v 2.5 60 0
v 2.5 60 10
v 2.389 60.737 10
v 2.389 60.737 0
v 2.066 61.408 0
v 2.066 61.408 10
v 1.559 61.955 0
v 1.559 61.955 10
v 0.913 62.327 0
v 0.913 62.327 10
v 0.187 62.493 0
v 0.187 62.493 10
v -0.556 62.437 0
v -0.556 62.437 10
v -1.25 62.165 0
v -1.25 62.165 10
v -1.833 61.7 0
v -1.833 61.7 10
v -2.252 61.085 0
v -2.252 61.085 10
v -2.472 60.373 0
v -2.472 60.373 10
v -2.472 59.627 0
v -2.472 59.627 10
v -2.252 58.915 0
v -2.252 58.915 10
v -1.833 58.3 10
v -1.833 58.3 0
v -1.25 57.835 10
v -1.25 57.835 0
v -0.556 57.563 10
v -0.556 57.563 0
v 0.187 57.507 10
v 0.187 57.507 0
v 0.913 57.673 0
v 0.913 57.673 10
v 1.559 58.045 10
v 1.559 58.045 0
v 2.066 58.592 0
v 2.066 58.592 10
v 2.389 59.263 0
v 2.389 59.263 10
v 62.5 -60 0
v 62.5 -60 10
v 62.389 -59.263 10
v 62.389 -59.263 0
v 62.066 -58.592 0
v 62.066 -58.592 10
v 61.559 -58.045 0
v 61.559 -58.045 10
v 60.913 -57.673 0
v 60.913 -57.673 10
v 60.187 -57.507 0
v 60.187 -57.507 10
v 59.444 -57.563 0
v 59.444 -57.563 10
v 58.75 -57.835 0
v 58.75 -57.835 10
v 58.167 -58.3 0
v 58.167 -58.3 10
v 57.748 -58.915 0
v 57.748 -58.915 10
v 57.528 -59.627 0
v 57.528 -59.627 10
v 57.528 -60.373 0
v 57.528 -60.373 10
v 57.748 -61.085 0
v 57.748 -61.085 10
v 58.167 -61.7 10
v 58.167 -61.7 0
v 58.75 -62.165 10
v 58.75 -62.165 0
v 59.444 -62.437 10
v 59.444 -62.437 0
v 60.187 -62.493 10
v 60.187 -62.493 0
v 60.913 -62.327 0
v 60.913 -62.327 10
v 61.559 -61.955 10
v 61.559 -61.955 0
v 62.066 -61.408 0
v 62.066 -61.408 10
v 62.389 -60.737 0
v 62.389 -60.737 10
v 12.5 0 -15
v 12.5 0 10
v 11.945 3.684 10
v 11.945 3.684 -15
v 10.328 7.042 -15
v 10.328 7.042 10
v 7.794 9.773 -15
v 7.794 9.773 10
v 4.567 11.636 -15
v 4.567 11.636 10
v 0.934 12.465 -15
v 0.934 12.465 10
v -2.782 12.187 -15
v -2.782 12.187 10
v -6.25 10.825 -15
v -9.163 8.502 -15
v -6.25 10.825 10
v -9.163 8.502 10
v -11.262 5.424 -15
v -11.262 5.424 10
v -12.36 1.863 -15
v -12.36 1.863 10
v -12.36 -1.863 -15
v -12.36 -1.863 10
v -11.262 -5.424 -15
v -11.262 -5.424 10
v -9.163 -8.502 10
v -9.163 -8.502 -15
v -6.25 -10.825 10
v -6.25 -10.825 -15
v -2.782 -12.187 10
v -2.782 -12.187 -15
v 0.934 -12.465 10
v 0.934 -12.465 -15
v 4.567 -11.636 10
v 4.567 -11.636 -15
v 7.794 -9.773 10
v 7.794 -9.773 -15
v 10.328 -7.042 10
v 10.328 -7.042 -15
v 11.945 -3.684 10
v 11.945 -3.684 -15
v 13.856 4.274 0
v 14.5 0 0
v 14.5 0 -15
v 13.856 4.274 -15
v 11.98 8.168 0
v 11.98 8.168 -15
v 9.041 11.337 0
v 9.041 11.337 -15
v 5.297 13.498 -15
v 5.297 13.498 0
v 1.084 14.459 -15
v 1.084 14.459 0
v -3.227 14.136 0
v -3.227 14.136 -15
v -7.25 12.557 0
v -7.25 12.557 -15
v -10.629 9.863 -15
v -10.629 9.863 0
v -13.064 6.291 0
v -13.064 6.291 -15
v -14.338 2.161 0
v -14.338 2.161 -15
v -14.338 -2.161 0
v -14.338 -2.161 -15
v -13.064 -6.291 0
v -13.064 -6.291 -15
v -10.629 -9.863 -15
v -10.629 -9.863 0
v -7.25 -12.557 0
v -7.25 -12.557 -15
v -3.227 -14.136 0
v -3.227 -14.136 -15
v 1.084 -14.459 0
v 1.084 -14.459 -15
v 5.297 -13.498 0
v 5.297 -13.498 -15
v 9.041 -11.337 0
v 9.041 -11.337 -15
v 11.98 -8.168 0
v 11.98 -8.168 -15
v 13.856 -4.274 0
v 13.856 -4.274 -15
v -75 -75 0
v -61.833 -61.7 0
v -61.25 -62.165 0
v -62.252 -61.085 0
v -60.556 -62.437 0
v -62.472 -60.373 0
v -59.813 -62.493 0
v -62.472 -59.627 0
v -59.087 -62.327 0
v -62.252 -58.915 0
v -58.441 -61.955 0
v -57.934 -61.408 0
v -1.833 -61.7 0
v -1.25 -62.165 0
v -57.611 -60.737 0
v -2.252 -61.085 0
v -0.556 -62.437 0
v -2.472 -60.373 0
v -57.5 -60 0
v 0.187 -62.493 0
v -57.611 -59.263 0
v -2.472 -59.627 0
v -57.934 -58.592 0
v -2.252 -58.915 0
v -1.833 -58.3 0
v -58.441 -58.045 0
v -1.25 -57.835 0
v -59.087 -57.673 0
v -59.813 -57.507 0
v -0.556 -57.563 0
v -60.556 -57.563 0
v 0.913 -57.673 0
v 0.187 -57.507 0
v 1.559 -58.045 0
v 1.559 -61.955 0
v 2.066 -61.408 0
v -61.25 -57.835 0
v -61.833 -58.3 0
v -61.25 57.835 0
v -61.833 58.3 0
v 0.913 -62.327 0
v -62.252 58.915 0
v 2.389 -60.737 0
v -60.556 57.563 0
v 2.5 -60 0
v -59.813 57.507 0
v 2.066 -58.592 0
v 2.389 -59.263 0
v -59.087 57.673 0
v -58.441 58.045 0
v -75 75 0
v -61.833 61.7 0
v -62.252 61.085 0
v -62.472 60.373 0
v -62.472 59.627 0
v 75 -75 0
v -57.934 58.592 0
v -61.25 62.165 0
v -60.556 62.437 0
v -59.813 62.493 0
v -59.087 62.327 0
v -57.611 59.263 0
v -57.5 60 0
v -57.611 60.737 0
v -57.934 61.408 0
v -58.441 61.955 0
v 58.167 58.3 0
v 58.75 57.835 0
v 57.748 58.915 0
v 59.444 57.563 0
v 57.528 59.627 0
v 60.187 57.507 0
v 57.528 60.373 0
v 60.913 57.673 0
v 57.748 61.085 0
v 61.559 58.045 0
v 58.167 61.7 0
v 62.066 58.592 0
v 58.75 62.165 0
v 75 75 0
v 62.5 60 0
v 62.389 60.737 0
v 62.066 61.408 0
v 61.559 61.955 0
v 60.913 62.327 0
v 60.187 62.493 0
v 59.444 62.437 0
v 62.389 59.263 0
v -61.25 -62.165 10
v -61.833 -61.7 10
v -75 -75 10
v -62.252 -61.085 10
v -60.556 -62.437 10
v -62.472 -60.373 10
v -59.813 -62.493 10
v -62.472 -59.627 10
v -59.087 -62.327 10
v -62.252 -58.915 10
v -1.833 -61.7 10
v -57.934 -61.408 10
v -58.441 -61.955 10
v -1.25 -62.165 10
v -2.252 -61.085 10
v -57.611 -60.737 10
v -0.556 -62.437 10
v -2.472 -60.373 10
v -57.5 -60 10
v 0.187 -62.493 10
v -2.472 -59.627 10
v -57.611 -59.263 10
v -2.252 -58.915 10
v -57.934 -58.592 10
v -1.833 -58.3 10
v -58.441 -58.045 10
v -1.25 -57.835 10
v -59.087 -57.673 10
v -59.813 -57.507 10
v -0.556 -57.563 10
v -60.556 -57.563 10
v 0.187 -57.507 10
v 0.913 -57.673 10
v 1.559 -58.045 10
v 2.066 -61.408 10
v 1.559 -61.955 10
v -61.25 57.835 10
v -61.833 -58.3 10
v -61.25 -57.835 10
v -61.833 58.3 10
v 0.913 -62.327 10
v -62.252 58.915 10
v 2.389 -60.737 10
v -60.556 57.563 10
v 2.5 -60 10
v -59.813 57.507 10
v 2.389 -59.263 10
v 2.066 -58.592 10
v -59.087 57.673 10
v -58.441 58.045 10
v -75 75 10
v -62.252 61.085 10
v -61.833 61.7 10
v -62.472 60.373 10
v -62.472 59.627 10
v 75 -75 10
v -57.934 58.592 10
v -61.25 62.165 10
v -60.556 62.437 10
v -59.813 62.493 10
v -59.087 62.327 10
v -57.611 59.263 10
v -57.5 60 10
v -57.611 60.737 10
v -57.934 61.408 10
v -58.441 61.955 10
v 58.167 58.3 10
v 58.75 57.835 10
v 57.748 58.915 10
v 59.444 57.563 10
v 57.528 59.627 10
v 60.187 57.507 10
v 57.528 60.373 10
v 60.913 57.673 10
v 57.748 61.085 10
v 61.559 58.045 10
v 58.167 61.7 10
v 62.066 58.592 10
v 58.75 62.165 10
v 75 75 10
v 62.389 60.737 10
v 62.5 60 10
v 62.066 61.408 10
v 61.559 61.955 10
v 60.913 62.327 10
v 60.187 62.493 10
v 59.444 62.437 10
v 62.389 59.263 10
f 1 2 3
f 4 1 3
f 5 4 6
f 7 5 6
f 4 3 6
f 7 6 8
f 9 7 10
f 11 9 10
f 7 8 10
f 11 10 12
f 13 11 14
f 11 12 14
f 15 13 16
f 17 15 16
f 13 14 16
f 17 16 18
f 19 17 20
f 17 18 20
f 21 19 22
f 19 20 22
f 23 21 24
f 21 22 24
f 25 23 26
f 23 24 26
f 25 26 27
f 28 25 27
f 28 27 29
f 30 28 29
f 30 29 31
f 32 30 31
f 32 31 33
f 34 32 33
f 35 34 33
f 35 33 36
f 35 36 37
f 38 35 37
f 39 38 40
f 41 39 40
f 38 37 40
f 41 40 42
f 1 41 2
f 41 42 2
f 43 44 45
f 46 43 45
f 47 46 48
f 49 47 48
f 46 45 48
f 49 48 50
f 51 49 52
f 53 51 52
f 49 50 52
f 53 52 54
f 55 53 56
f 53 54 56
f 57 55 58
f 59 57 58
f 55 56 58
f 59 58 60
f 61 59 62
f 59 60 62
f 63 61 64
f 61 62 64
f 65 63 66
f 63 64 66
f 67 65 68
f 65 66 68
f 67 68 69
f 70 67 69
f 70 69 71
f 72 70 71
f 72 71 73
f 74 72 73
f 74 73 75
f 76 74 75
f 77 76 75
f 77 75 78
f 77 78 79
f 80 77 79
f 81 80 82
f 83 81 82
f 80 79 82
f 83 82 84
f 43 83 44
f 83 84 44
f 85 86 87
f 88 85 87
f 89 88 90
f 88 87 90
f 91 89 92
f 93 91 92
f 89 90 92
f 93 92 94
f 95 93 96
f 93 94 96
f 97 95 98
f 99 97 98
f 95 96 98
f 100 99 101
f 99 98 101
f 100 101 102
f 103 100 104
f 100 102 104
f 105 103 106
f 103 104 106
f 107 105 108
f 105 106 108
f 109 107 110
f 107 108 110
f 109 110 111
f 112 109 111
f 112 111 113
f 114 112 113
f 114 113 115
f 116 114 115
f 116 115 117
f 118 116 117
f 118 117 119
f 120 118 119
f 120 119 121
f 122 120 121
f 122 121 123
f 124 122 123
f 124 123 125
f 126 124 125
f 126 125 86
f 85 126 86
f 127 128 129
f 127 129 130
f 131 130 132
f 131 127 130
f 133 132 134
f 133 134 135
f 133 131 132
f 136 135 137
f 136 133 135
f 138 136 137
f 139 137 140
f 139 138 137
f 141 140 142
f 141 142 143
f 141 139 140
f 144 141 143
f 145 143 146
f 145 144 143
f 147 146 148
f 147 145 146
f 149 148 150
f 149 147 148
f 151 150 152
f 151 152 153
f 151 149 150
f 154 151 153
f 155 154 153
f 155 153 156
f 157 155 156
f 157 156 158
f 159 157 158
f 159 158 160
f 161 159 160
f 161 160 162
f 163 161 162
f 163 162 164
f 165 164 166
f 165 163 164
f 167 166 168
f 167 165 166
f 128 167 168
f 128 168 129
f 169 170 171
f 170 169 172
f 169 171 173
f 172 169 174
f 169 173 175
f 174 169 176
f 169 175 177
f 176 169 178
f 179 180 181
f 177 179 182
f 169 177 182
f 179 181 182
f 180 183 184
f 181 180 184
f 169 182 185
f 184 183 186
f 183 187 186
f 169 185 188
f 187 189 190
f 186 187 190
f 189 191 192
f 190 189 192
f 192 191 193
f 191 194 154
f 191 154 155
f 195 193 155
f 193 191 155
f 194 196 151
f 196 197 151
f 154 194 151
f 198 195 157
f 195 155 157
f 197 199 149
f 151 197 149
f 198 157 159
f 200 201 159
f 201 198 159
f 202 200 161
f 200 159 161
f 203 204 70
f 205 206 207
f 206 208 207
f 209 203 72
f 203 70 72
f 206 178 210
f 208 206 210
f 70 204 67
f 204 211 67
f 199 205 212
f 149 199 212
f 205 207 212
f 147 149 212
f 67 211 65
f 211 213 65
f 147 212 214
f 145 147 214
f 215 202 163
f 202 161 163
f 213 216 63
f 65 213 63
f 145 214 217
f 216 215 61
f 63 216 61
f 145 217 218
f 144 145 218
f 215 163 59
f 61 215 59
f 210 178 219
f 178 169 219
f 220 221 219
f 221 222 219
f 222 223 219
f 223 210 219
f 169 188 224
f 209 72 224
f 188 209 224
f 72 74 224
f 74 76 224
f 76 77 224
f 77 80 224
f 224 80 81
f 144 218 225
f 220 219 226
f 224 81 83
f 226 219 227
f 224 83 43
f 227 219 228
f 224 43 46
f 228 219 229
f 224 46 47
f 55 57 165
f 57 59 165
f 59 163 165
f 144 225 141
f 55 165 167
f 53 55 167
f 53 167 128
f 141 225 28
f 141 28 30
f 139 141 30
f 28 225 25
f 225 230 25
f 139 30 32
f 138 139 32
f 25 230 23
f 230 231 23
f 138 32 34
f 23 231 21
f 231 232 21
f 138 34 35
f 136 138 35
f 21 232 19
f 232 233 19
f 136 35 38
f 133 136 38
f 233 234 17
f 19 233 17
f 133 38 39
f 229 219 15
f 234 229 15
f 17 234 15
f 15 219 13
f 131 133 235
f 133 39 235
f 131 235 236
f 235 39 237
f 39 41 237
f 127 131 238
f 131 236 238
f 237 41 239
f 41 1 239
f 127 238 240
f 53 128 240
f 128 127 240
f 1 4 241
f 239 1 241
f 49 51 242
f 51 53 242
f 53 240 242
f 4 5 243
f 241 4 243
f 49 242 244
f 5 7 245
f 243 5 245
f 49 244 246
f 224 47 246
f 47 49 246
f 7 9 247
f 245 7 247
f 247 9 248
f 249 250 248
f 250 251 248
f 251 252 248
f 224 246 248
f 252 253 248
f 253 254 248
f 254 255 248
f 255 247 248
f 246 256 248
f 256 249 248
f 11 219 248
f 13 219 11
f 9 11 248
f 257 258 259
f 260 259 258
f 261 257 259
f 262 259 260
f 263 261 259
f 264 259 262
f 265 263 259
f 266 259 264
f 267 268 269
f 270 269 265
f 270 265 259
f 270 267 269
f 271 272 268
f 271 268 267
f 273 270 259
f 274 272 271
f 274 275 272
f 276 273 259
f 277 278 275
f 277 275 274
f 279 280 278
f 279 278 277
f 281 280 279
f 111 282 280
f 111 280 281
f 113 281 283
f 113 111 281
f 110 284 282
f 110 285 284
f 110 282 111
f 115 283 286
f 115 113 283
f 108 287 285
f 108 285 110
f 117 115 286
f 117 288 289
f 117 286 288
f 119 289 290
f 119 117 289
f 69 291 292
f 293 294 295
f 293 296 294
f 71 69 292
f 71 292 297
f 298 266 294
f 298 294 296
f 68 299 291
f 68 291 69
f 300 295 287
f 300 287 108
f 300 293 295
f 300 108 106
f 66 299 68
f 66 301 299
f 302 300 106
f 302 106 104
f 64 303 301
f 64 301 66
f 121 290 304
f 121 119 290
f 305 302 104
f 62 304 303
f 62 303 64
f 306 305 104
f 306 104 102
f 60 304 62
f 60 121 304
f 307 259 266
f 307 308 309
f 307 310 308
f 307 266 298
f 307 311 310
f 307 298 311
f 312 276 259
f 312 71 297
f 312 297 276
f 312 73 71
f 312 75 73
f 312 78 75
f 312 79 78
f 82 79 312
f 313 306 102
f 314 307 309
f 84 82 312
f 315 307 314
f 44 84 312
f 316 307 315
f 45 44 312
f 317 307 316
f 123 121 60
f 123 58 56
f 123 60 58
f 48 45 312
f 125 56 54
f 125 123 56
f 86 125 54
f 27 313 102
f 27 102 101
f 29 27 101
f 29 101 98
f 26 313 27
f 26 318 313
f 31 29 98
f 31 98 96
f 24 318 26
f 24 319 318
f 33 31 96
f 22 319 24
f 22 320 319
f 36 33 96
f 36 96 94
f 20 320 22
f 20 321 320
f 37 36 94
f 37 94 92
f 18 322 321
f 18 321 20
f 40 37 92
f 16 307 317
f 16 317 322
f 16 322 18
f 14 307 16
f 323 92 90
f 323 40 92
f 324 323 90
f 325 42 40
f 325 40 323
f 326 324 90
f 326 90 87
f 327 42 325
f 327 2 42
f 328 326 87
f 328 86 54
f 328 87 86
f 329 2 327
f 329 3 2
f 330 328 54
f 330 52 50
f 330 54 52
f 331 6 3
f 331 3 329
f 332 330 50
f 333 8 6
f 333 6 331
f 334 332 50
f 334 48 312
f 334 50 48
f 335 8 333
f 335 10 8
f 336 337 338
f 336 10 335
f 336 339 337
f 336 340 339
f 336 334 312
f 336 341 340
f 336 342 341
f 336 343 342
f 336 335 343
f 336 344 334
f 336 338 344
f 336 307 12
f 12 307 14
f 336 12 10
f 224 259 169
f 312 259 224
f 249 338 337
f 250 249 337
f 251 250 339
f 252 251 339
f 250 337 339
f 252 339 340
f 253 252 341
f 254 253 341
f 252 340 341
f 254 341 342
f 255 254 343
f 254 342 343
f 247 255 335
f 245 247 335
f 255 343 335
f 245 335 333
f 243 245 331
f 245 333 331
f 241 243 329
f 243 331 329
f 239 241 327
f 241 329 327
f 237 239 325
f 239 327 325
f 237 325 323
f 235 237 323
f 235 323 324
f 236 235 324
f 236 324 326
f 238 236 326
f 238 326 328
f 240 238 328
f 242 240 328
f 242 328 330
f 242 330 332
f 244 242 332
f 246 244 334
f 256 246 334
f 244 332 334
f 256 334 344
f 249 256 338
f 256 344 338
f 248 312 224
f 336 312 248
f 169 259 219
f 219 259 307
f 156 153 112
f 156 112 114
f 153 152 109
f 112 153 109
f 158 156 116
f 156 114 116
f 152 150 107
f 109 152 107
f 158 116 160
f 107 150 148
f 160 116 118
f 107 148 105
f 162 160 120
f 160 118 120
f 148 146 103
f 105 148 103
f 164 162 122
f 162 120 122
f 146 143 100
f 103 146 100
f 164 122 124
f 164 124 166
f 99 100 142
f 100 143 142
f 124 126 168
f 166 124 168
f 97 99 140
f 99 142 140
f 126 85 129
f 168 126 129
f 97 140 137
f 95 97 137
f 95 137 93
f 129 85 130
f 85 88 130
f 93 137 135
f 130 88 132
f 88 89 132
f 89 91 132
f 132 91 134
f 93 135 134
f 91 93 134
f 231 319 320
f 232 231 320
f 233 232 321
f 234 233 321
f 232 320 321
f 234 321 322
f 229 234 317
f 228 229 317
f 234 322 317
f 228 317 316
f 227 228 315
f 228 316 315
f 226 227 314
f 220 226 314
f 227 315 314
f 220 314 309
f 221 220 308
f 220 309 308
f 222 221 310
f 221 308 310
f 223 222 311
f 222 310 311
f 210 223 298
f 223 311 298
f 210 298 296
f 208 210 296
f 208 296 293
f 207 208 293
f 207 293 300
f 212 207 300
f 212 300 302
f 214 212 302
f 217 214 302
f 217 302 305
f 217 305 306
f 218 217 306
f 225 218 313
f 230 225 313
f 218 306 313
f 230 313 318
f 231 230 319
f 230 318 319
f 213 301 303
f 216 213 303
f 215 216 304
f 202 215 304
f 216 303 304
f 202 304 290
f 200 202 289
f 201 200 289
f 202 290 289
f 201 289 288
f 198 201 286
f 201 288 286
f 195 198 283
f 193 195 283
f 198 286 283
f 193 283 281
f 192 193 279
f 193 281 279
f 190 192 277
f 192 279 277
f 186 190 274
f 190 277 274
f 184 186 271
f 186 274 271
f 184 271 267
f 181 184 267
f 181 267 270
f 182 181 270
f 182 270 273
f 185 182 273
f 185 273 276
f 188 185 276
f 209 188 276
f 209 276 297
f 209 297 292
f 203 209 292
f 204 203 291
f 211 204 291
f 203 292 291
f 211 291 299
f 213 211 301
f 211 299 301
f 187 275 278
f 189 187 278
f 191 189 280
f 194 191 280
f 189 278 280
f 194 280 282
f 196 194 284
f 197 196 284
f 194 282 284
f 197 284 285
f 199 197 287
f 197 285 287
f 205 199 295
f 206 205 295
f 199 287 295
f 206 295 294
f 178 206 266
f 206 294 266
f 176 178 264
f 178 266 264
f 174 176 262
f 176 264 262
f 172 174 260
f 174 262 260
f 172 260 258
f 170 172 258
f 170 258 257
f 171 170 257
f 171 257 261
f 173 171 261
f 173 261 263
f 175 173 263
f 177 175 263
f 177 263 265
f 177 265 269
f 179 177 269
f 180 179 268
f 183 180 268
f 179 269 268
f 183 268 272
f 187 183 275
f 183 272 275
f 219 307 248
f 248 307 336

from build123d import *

# Parameters (mm, degrees)
SKETCH_1_R          = 14.5
SKETCH_1_R_2        = 12.5
EXTRUDE_1_DEPTH     = 15
EXTRUDE_START       = 10
SKETCH_1_3_W        = 150
SKETCH_1_3_H        = 150
SKETCH_1_3_R        = 12.5
EXTRUDE_1_2_DEPTH   = 10
SKETCH_2_R          = 2.5
CUT_EXTRUDE_1_DEPTH = 10


with BuildPart() as part:
    # 草图1 → Extrude 1 (new body)
    with BuildSketch(Plane.XY):
        Circle(SKETCH_1_R)
        Circle(SKETCH_1_R_2, mode=Mode.SUBTRACT)
    extrude(amount=-EXTRUDE_1_DEPTH)

    # 草图1<3> → Extrude 1 2 (add)
    with BuildSketch(Plane.XY.offset(EXTRUDE_START)):
        Rectangle(SKETCH_1_3_W, SKETCH_1_3_H)
        Circle(SKETCH_1_3_R, mode=Mode.SUBTRACT)
    extrude(amount=-EXTRUDE_1_2_DEPTH)

    # 草图2 → 切除-拉伸1 (cut)
    with BuildSketch(Plane.XY.offset(10)):
        with Locations((-60, 60)):
            Circle(SKETCH_2_R)
        with Locations((0, 60)):
            Circle(SKETCH_2_R)
        with Locations((60, 60)):
            Circle(SKETCH_2_R)
        with Locations((60, -60)):
            Circle(SKETCH_2_R)
        with Locations((0, -60)):
            Circle(SKETCH_2_R)
        with Locations((-60, -60)):
            Circle(SKETCH_2_R)
    extrude(amount=-CUT_EXTRUDE_1_DEPTH, mode=Mode.SUBTRACT)


solid = part.part
